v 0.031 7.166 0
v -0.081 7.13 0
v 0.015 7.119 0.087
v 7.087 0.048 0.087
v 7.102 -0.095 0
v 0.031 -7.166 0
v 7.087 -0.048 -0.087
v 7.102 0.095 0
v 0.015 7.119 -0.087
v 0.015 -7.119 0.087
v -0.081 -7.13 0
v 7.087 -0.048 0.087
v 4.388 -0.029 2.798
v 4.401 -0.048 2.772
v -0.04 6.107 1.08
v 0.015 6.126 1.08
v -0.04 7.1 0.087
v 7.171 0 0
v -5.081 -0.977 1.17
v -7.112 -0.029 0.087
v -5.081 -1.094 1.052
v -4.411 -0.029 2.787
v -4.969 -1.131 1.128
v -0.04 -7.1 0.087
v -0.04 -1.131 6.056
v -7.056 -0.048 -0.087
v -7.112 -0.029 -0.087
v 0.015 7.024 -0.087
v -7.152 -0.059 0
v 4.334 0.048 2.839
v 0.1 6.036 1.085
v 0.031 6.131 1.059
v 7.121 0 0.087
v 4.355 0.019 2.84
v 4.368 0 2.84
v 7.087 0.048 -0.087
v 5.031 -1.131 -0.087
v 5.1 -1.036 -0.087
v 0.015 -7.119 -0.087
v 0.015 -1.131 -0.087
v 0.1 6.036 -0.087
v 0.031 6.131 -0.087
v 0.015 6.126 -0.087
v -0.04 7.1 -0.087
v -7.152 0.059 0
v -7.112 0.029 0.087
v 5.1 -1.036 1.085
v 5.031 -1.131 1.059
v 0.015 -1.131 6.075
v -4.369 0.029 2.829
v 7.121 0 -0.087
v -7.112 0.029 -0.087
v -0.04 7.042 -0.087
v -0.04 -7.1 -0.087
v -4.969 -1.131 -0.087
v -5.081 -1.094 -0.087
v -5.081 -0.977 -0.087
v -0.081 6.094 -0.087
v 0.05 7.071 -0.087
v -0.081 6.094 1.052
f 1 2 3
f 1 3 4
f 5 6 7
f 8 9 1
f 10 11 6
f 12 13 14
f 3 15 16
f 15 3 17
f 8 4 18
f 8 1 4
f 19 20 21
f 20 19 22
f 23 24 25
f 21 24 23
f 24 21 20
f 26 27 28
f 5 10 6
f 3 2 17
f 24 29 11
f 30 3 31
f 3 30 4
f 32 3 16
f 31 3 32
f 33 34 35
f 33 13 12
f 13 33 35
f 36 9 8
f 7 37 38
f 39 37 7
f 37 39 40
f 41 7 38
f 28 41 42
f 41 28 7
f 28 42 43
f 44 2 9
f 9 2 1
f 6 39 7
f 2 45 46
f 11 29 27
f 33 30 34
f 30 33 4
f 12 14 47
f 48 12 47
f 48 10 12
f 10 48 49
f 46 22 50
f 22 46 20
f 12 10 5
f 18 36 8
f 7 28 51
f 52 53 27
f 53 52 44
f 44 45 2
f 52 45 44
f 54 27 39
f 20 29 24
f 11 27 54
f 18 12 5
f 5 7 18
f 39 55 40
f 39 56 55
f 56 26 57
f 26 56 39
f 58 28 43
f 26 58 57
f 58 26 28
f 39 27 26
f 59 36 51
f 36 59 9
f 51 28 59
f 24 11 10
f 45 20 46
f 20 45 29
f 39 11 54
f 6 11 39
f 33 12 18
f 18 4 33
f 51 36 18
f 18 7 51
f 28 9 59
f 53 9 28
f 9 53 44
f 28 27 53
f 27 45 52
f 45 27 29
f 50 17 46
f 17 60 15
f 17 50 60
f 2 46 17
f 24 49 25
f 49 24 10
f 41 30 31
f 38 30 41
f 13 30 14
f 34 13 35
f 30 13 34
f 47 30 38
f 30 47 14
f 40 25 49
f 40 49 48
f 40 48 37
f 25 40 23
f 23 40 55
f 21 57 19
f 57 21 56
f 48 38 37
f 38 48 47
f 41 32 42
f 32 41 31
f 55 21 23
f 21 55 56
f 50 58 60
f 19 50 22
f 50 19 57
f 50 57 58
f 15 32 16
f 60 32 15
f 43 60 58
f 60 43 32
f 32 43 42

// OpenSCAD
// Auto-generated OpenSCAD file

    inner_points = 10*[[0.499999999647243, -0.10355339109877267, -0.5000000000000022], [-0.5000000003527529, -0.10355339028132902, 0.5000000000000022], [-0.5000000003527572, -0.10355339028132601, -0.49999999999999795], [0.4999999996472473, -0.10355339109877568, 0.49999999999999795], [2.2526713020467915e-10, 0.6035533904964967, 2.128597539314253e-15]];

    outer_points = 10*[[0.7071067811865476, 0.0, -2.669135025276785e-09], [-0.7071067811865476, 0.0, 2.669135025276785e-09], [-2.6278612663574398e-14, 0.7071067811522772, -6.961725442369196e-06], [2.6278612663574398e-14, -0.7071067811522772, 6.961725442369196e-06], [2.6691350251474237e-09, 6.961725442369196e-06, 0.7071067811522772]];

    // Convex hull for inner set (I)
    module inner_hull() {
        hull() {
            for (p = inner_points) {
                translate(p) sphere(r=0.1);
            }
        }
    }

    // Convex hull for outer set (O) minus inner hull (O \ I)
    module outer_minus_inner() {
        difference() {
            hull() {
                for (p = outer_points) {
                    translate(p) sphere(r=0.1);
                }
            }
            inner_hull(); // Subtract inner hull
        }
    }

    // Convex hull for outer set (O) minus all translated inner hulls
    module outer_minus_AllTranslationInner() {
        difference() {
            hull() {
                for (p = outer_points) {
                    translate(p) sphere(r=0.1);
                }
            }
            hull() {
                translate([0,0,50]) inner_hull();
                translate([0,0,-50]) inner_hull();
            }; // Subtract translated inner hulls
        }
    }

    // Difference between outer_minus_inner and outer_minus_AllTranslationInner
    module outer_minus_inner_diff() {
        difference() {
            // Outer minus inner
            difference() {
                hull() {
                    for (p = outer_points) {
                        translate(p) sphere(r=0.1);
                    }
                }
                inner_hull();
            }

            // Subtract Outer minus AllTranslationInner
            difference() {
                hull() {
                    for (p = outer_points) {
                        translate(p) sphere(r=0.1);
                    }
                }
                hull() {
                    translate([0,0,50]) inner_hull();
                    translate([0,0,-50]) inner_hull();
                };
            }
        }
    }

    // Rendering all with colors applied
    color([0, 1, 0, 1]) outer_minus_AllTranslationInner(); // Opaque green
    
